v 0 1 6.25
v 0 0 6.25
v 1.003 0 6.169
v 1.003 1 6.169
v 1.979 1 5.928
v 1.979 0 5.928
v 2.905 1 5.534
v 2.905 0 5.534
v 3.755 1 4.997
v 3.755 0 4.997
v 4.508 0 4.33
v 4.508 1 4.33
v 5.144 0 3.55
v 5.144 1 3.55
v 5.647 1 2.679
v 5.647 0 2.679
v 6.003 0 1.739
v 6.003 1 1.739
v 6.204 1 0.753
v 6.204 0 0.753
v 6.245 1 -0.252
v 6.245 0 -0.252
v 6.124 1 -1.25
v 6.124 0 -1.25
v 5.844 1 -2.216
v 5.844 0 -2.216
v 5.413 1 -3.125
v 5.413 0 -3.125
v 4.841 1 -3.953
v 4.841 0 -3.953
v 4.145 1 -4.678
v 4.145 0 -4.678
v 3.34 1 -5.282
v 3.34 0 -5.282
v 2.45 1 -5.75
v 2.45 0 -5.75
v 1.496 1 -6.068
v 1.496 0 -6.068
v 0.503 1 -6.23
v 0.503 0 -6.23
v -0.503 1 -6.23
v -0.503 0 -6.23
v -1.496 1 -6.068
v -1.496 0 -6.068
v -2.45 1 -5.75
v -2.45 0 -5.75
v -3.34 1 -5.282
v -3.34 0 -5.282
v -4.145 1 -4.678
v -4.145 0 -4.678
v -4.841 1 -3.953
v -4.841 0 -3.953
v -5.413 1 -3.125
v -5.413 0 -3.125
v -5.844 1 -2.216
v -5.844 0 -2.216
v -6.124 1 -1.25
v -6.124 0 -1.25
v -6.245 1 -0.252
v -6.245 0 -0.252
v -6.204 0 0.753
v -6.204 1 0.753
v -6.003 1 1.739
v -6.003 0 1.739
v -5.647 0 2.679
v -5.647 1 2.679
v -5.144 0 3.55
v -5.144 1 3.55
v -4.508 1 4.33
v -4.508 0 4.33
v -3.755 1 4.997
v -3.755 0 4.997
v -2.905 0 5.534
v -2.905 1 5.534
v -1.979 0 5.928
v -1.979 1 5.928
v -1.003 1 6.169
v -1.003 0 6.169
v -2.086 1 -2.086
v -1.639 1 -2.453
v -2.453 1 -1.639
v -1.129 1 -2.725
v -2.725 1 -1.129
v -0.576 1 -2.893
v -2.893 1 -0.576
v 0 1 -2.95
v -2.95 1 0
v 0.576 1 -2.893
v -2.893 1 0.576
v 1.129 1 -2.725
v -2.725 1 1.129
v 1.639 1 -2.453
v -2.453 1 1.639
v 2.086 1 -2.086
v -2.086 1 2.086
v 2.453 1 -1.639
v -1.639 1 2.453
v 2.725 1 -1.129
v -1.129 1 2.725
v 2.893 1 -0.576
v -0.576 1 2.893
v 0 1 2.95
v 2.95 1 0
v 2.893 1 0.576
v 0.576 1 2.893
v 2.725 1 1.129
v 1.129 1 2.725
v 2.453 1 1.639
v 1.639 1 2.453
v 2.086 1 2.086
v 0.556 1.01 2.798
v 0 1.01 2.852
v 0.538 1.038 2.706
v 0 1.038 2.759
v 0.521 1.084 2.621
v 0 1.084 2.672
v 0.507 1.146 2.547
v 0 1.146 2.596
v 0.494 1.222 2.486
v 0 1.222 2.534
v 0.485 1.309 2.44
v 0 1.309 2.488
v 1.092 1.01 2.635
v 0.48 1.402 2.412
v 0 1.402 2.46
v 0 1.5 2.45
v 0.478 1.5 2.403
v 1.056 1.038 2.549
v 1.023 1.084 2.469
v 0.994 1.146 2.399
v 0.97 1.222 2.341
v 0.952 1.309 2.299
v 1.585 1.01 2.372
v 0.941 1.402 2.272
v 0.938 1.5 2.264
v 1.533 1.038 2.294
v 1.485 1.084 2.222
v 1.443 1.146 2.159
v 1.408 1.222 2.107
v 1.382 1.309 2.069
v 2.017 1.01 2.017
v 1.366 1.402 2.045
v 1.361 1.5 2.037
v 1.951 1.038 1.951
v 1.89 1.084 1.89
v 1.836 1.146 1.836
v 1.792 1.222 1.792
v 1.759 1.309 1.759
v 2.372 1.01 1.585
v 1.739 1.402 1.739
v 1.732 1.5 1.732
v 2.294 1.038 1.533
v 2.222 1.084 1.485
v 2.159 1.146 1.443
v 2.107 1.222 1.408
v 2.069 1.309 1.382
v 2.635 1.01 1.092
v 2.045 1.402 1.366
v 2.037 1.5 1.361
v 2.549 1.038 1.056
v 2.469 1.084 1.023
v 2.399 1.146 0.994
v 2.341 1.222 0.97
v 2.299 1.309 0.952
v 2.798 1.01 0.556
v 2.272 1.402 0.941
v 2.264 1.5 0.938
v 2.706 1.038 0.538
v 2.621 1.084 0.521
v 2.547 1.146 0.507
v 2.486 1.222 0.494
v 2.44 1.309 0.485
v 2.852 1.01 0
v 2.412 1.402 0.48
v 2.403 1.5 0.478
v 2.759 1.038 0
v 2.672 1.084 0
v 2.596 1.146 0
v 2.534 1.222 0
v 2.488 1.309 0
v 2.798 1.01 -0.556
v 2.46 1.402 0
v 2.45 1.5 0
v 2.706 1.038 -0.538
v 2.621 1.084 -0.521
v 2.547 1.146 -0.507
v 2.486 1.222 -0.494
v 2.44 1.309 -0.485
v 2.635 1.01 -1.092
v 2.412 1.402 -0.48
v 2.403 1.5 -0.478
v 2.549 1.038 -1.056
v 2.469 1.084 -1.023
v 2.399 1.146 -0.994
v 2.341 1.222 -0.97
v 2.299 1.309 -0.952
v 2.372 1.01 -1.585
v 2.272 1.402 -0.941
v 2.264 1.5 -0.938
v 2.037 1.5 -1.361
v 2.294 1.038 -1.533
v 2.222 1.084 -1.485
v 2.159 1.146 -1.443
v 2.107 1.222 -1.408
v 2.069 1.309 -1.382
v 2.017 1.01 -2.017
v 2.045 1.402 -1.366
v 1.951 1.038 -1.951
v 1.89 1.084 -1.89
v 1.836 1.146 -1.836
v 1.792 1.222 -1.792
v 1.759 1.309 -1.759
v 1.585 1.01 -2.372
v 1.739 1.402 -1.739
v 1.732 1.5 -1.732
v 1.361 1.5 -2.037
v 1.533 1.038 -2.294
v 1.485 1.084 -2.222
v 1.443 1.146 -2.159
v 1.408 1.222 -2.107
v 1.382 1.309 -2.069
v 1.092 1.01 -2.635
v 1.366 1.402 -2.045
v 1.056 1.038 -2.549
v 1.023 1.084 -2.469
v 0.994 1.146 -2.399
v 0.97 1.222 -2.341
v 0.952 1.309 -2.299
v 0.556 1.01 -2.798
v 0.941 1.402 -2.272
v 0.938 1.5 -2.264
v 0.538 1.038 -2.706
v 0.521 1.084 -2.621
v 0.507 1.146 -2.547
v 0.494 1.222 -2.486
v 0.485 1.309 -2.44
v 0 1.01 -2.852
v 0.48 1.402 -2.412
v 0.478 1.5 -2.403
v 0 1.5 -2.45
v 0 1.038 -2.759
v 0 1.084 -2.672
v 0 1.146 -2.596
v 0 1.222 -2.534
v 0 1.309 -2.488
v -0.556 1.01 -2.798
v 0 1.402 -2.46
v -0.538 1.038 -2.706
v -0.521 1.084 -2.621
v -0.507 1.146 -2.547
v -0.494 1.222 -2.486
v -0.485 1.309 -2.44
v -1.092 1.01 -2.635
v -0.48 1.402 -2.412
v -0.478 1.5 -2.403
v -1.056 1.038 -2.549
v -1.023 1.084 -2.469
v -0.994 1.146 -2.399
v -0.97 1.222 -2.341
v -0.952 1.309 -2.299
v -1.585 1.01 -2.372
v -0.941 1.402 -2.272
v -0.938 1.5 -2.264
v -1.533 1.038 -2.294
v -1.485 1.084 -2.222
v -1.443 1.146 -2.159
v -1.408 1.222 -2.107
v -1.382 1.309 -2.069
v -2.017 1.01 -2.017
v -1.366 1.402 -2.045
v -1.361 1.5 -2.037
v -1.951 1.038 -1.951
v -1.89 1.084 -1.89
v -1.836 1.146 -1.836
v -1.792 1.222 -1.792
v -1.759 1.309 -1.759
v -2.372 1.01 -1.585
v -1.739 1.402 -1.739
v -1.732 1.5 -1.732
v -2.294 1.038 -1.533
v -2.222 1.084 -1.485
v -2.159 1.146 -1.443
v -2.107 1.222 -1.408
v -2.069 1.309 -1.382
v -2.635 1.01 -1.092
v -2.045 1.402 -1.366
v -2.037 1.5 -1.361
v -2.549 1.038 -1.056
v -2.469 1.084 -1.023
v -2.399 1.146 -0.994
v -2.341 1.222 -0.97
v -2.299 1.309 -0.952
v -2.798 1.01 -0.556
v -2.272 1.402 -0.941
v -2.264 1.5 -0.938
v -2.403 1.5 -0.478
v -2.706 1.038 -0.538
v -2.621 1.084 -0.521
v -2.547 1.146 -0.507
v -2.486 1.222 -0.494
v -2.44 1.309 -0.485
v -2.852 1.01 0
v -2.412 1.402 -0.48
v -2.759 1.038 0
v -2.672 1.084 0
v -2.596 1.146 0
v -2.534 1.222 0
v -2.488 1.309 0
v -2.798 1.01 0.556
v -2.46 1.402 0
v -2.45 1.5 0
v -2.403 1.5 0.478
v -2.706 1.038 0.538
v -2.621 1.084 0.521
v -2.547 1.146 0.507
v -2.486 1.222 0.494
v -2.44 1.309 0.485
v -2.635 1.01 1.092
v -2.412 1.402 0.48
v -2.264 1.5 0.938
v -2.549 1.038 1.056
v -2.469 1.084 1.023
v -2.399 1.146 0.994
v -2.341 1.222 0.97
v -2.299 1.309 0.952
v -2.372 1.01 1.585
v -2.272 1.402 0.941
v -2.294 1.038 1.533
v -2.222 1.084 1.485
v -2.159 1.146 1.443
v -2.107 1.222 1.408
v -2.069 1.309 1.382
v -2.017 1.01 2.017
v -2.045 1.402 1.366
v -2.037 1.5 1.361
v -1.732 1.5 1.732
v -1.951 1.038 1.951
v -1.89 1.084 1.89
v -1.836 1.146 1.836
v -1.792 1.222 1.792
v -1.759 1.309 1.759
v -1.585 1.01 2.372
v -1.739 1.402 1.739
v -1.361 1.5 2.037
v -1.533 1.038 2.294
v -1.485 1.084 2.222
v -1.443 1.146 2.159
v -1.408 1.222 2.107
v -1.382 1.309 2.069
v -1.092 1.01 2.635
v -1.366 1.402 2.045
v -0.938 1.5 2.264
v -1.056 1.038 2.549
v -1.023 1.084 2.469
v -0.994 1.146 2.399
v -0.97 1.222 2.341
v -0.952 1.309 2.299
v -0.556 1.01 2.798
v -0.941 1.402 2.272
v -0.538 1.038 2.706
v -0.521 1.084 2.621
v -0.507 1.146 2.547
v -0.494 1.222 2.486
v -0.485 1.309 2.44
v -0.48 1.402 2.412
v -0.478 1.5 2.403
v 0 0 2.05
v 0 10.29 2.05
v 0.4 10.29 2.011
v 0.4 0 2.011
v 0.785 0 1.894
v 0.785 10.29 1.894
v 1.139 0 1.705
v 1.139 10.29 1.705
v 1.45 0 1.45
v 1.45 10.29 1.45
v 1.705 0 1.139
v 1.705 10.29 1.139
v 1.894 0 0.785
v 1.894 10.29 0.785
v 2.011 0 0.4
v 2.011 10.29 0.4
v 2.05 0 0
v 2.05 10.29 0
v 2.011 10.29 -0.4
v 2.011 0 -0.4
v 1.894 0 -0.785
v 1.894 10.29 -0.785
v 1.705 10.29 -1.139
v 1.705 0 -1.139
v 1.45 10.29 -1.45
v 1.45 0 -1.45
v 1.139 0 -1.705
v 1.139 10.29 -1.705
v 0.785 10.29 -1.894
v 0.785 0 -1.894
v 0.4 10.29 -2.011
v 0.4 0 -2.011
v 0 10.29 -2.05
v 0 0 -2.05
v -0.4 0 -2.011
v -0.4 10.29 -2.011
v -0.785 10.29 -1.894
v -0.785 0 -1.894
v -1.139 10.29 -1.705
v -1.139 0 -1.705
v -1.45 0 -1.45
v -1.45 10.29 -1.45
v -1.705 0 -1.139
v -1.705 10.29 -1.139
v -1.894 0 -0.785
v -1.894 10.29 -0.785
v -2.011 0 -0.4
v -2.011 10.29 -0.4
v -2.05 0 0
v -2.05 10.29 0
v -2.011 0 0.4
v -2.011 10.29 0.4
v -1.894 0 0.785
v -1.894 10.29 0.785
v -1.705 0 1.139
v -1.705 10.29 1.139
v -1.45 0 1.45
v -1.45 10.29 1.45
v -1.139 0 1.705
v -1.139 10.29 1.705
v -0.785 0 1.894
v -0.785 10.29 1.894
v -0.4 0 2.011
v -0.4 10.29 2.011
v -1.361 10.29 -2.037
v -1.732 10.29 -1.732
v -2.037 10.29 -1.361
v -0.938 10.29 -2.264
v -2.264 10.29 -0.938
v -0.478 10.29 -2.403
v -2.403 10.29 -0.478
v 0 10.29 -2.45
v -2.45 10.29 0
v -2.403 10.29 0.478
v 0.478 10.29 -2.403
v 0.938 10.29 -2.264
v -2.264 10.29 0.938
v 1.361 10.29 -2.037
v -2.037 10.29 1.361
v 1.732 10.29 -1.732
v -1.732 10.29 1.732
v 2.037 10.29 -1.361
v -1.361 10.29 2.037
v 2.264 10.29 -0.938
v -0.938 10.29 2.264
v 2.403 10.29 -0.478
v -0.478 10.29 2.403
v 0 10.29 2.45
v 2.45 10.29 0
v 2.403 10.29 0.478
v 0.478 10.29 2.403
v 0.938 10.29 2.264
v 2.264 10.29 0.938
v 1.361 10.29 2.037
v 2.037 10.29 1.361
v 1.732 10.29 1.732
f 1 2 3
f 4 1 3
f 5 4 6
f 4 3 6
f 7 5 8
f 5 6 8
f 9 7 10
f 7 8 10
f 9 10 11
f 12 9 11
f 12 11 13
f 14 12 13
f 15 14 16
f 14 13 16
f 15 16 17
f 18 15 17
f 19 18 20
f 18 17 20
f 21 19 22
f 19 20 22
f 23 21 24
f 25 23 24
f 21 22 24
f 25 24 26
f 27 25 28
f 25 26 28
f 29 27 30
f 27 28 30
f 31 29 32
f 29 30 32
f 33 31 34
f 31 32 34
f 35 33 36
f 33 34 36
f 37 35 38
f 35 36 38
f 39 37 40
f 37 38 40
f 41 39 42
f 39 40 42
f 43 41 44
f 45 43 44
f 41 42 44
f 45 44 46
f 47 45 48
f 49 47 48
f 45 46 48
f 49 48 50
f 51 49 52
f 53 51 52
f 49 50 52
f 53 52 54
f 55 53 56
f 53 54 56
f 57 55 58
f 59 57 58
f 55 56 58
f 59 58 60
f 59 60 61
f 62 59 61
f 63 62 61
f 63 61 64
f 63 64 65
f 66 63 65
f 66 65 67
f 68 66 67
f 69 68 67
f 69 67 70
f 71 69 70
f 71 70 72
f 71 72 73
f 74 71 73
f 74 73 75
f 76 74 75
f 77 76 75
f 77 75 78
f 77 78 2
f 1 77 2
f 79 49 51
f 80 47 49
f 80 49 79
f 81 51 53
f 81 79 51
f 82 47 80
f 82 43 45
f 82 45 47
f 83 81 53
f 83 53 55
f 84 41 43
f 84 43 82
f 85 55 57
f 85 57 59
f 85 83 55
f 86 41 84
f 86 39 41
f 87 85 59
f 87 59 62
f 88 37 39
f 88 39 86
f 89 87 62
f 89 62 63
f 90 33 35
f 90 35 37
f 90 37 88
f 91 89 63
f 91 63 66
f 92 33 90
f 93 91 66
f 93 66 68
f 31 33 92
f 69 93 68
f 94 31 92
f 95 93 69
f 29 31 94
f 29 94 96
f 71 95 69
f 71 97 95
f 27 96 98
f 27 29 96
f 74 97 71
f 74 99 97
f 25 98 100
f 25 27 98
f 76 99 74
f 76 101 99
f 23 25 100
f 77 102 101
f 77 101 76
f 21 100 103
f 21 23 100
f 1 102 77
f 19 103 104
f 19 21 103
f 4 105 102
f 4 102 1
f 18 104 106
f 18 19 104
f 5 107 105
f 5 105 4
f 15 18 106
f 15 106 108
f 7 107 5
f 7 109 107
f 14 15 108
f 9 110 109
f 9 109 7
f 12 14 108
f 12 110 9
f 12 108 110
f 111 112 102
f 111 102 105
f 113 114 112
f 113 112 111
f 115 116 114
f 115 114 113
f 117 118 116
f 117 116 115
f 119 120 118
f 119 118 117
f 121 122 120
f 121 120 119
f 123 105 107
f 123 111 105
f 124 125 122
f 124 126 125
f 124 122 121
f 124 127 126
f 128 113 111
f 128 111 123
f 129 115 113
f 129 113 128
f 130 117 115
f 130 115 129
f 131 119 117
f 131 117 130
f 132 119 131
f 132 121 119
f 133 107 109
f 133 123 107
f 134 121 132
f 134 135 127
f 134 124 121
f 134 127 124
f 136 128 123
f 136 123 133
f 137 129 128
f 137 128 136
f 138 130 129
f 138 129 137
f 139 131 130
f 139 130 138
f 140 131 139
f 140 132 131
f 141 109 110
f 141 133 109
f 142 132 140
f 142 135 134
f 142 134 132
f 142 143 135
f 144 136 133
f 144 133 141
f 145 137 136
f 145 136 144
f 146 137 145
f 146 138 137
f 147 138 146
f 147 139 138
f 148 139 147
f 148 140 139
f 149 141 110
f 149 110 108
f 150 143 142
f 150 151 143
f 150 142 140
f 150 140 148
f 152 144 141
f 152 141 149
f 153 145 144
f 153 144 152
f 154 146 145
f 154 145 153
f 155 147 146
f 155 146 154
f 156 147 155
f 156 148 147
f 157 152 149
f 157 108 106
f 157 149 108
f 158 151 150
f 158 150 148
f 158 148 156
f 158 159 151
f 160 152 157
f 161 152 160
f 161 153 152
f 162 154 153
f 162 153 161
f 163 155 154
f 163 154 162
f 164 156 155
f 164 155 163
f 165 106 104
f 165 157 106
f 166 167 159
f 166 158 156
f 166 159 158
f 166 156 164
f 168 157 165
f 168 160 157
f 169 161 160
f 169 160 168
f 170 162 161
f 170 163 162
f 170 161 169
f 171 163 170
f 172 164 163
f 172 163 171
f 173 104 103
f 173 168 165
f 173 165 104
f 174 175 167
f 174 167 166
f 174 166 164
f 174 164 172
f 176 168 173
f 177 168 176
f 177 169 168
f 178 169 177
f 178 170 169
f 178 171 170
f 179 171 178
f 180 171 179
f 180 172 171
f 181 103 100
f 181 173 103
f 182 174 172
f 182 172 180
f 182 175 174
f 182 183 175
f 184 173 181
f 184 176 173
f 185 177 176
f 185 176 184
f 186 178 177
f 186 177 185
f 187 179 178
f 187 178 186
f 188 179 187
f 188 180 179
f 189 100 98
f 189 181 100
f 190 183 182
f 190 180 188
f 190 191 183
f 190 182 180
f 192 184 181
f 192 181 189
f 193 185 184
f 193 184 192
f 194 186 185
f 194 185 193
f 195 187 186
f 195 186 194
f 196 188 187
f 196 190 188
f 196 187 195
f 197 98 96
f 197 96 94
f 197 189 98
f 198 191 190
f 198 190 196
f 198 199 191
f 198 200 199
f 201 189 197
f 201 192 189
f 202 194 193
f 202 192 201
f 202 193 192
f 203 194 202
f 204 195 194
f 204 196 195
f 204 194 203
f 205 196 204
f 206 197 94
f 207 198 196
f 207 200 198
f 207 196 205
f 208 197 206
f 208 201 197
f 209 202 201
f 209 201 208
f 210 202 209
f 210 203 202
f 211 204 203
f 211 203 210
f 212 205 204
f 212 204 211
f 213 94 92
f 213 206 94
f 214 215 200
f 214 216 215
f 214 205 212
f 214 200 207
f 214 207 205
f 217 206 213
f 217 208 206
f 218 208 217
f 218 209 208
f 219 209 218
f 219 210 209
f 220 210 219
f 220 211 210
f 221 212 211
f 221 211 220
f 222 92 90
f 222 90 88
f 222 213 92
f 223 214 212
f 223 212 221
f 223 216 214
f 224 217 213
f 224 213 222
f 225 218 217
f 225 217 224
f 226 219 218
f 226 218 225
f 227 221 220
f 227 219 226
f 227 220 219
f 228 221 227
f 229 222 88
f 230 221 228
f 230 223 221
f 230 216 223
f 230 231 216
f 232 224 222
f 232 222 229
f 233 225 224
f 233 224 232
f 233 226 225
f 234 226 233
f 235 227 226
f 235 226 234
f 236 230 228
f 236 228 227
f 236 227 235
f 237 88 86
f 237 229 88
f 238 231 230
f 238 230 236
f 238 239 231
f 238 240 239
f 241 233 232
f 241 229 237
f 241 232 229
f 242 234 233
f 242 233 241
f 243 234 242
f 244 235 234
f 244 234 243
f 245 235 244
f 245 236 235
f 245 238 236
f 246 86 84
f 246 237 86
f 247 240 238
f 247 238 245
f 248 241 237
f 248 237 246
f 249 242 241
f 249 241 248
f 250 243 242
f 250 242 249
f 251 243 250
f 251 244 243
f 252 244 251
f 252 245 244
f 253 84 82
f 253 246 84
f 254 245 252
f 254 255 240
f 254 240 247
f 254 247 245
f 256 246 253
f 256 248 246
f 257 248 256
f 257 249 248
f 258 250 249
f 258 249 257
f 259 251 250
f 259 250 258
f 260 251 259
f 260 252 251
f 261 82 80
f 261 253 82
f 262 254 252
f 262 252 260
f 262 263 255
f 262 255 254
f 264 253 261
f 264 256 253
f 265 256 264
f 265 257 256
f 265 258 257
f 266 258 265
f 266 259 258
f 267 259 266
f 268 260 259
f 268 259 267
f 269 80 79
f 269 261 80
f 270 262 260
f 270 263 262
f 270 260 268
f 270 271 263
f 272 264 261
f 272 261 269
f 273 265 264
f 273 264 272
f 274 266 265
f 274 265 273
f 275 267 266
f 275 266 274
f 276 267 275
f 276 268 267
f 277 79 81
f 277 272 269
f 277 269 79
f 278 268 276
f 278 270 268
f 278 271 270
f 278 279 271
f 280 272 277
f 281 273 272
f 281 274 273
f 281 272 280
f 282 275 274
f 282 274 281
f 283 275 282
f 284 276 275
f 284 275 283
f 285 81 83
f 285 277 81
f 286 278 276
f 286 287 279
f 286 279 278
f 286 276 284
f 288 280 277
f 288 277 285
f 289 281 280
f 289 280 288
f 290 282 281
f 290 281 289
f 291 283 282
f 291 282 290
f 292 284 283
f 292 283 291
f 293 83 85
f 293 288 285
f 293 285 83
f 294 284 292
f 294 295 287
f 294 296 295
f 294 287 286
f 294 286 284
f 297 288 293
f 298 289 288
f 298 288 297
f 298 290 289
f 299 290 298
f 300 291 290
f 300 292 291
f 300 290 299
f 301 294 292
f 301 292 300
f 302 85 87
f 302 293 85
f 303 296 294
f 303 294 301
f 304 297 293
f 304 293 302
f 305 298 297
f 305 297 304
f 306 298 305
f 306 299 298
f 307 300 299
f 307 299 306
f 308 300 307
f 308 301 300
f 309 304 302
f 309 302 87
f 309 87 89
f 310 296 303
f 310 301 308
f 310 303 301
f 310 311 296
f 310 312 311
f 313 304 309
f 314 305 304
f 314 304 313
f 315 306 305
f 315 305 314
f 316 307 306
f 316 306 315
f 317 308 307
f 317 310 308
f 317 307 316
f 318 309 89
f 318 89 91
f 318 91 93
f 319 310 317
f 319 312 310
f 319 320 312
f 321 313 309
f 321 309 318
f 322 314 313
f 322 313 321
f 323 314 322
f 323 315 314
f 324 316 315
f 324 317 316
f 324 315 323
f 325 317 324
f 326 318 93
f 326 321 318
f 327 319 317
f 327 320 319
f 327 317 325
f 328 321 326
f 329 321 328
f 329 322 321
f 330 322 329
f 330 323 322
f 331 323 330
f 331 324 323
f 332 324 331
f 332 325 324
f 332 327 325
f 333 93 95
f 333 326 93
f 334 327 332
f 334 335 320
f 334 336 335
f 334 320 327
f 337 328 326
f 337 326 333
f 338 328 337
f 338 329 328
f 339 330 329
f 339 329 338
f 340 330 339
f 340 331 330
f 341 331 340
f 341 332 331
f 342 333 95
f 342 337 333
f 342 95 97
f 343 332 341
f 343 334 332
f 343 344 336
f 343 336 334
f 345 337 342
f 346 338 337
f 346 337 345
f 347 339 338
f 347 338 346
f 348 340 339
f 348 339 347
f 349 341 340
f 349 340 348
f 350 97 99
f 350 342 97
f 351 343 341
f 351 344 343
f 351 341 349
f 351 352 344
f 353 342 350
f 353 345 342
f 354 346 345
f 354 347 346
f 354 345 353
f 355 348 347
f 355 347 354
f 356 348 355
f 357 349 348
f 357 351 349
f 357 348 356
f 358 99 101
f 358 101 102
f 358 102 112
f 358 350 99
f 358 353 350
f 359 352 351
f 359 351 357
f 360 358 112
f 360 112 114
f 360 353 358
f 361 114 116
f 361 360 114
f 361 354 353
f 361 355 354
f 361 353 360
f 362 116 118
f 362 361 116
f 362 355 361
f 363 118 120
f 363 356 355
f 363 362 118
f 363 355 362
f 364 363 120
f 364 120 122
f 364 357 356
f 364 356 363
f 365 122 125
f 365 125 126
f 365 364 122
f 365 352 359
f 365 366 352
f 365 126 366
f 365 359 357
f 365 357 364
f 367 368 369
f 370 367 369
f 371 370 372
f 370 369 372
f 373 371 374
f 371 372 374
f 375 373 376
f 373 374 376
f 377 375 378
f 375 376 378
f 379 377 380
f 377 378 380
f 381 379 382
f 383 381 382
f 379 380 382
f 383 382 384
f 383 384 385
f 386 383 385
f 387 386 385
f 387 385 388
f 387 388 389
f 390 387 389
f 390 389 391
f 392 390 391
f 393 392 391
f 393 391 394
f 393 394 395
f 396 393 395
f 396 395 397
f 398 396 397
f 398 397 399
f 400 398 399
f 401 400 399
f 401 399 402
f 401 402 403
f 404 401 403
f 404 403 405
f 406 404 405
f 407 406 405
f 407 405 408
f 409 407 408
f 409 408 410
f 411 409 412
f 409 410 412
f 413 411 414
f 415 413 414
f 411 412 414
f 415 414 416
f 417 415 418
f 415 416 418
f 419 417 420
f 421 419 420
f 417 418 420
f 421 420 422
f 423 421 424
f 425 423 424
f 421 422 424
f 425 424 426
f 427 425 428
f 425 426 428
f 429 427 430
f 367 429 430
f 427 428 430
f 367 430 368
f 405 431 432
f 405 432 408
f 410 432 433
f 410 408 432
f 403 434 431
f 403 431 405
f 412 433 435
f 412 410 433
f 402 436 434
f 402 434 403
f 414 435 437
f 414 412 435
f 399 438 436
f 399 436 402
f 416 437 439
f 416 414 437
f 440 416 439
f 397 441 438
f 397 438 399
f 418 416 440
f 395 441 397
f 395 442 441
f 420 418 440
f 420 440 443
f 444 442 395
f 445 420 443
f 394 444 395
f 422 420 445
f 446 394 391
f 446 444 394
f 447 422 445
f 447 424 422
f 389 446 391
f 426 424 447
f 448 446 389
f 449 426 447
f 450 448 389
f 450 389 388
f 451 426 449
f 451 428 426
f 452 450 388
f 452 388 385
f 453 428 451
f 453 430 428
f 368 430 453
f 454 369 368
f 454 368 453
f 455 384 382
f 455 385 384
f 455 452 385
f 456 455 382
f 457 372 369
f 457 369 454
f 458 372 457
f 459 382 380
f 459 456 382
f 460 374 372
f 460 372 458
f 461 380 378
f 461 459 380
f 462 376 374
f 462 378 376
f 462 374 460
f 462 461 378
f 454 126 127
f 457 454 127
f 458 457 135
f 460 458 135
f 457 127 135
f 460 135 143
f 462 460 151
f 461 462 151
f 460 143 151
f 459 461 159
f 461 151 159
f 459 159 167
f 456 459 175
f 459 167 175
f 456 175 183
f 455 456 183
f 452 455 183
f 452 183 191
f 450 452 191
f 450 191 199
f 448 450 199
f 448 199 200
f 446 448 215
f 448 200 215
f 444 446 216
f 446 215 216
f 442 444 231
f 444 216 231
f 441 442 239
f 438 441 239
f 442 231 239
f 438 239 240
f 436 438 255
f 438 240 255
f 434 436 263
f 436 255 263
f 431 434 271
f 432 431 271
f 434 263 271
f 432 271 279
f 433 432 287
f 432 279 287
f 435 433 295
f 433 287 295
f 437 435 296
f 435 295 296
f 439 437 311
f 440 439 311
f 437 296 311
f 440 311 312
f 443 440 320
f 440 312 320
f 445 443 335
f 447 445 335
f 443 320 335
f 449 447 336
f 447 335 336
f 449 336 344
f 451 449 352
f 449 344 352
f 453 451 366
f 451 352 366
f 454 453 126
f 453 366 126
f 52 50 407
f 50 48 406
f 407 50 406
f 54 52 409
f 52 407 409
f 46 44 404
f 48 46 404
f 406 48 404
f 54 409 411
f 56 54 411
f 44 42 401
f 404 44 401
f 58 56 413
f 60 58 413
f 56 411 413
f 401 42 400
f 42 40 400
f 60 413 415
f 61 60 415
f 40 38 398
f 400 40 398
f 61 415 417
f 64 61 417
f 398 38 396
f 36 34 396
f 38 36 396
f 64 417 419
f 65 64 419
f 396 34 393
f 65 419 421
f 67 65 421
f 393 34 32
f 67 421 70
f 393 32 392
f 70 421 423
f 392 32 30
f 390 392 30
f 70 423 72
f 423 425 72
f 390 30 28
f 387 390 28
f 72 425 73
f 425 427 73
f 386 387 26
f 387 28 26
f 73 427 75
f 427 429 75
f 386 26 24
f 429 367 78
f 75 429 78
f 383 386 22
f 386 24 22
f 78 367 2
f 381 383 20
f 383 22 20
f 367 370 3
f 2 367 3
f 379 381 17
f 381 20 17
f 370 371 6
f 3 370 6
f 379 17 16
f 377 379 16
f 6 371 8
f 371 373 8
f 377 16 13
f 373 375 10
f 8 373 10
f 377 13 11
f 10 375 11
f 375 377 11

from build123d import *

# Parameters (mm, degrees)
CROQUIS1_R              = 6.25
SALIENTE_EXTRUIR1_DEPTH = 1
CROQUIS2_R              = 2.45
SALIENTE_EXTRUIR2_DEPTH = 9.29
CROQUIS3_R              = 2.05
CORTAR_EXTRUIR1_DEPTH   = 14.564995393
REDONDEO1_R             = 0.5


with BuildPart() as part:
    # Croquis1 → Saliente-Extruir1 (new body)
    with BuildSketch(Plane(origin=(0, 0, 0), x_dir=(1, 0, 0), z_dir=(0, 1, 0))):
        with Locations(Location((0, 0, 0), (0, 0, 270))):
            Circle(CROQUIS1_R)
    extrude(amount=SALIENTE_EXTRUIR1_DEPTH)

    # Croquis2 → Saliente-Extruir2 (add)
    with BuildSketch(Plane(origin=(0, 1, 0), x_dir=(1, 0, 0), z_dir=(0, 1, 0))):
        with Locations(Location((0, 0, 0), (0, 0, 270))):
            Circle(CROQUIS2_R)
    extrude(amount=SALIENTE_EXTRUIR2_DEPTH)

    # Croquis3 → Cortar-Extruir1 (cut, through all)
    with BuildSketch(Plane(origin=(0, 10.29, 0), x_dir=(1, 0, 0), z_dir=(0, 1, 0))):
        with Locations(Location((0, 0, 0), (0, 0, 270))):
            Circle(CROQUIS3_R)
    extrude(amount=-CORTAR_EXTRUIR1_DEPTH, mode=Mode.SUBTRACT)

    # Redondeo1
    redondeo1_edges = [part.edges().sort_by_distance(p)[0] for p in [
        (0, 1, -2.45),
    ]]
    fillet(redondeo1_edges, radius=REDONDEO1_R)


solid = part.part
